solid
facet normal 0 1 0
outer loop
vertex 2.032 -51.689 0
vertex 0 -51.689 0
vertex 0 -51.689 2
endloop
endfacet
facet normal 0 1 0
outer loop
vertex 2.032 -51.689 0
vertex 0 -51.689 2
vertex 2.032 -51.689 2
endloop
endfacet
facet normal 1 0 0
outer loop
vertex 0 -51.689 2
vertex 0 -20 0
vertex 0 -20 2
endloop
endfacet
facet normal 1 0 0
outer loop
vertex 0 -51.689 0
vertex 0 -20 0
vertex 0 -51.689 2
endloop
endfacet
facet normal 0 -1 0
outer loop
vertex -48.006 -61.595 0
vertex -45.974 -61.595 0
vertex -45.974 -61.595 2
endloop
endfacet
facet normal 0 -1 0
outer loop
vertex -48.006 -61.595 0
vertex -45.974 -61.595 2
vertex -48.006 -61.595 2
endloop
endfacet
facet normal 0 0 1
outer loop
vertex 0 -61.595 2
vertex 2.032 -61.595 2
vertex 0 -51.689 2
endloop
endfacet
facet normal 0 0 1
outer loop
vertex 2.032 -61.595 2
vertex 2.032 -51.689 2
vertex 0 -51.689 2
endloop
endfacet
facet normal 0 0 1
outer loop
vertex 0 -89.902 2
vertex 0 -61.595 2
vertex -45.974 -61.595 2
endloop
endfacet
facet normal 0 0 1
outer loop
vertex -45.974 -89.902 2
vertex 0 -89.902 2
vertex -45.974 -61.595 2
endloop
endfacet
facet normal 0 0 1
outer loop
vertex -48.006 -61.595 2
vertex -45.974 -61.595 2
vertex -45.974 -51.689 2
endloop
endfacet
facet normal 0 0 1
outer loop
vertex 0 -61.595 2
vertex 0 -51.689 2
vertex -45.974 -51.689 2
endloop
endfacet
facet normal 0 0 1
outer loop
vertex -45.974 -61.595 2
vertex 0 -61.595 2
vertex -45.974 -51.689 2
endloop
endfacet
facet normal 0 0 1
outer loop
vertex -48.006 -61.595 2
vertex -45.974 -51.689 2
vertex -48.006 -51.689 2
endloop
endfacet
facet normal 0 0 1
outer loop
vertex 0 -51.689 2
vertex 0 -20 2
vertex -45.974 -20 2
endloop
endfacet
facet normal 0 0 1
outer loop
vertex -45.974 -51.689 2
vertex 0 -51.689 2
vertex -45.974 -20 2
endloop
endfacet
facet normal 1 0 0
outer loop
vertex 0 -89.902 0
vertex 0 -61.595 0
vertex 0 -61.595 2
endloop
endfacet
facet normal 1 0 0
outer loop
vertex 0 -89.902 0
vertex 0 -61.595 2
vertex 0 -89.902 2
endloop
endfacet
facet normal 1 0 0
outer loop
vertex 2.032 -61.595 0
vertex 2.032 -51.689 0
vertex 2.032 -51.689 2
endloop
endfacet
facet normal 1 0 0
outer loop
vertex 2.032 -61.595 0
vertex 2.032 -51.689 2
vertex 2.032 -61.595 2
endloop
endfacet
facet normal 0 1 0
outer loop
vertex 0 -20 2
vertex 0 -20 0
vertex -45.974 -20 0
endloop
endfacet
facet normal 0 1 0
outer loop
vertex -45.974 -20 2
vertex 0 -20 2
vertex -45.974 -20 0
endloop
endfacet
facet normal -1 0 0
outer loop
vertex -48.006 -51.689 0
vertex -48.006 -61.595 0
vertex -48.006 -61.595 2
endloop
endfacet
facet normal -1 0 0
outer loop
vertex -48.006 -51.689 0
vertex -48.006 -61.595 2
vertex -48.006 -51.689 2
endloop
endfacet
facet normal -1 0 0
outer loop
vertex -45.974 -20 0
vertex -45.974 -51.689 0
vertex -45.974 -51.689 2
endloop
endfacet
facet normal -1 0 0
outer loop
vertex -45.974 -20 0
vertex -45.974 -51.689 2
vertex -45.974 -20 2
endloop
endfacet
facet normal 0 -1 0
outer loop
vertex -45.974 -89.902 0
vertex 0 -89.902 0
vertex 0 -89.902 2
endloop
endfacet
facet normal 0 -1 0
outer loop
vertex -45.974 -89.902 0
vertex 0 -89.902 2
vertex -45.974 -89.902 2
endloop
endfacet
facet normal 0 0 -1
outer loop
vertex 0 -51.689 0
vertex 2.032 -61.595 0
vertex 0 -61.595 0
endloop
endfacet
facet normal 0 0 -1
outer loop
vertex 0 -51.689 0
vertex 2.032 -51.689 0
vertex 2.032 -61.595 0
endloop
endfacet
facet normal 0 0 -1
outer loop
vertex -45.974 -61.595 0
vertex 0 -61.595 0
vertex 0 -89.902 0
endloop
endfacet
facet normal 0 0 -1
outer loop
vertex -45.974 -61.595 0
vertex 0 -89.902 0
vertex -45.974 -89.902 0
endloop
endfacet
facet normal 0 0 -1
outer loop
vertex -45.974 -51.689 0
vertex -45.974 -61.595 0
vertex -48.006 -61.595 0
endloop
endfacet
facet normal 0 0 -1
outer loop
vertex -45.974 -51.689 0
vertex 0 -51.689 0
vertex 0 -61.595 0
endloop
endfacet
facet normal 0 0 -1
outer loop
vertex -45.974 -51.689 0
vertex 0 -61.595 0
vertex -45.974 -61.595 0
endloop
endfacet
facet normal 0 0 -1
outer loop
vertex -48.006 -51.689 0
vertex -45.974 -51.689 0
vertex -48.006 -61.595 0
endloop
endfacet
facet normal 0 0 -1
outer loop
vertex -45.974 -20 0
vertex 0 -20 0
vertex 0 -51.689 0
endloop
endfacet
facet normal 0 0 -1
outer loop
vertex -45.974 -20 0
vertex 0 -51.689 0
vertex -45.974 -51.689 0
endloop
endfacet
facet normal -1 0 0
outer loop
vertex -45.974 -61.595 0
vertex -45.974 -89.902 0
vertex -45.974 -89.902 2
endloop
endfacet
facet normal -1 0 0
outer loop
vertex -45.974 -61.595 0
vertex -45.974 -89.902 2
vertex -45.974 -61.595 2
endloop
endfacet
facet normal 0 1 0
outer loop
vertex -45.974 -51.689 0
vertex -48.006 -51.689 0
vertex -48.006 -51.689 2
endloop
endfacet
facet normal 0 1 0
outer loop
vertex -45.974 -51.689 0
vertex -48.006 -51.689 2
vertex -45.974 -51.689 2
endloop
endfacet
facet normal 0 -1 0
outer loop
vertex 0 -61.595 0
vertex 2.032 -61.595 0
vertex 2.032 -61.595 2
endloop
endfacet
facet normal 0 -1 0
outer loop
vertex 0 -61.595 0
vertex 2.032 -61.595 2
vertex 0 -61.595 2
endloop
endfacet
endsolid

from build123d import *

# Parameters (mm, degrees)
EXTRUDE_1_DEPTH     = 2
SKETCH_2_W          = 45.974
SKETCH_2_H          = 20
SKETCH_2_H_2        = 15
CUT_EXTRUDE_1_DEPTH = 10


with BuildPart() as part:
    # Эскиз1 → Бобышка-Вытянуть1 (new body)
    with BuildSketch(Plane.XY):
        Polygon((0, -61.595), (0, -104.902), (-45.974, -104.902), (-45.974, -61.595), (-48.006, -61.595), (-48.006, -51.689), (-45.974, -51.689), (-45.974, 0), (0, 0), (0, -51.689), (2.032, -51.689), (2.032, -61.595), align=None)
    extrude(amount=EXTRUDE_1_DEPTH)

    # Эскиз2 → Вырез-Вытянуть1 (cut)
    with BuildSketch(Plane(origin=(0, 0, 0), x_dir=(-1, 0, 0), z_dir=(0, 0, -1))):
        with Locations((22.987, -10)):
            Rectangle(SKETCH_2_W, SKETCH_2_H)
        with Locations((22.987, -97.402)):
            Rectangle(SKETCH_2_W, SKETCH_2_H_2)
    extrude(amount=-CUT_EXTRUDE_1_DEPTH, mode=Mode.SUBTRACT)


solid = part.part
